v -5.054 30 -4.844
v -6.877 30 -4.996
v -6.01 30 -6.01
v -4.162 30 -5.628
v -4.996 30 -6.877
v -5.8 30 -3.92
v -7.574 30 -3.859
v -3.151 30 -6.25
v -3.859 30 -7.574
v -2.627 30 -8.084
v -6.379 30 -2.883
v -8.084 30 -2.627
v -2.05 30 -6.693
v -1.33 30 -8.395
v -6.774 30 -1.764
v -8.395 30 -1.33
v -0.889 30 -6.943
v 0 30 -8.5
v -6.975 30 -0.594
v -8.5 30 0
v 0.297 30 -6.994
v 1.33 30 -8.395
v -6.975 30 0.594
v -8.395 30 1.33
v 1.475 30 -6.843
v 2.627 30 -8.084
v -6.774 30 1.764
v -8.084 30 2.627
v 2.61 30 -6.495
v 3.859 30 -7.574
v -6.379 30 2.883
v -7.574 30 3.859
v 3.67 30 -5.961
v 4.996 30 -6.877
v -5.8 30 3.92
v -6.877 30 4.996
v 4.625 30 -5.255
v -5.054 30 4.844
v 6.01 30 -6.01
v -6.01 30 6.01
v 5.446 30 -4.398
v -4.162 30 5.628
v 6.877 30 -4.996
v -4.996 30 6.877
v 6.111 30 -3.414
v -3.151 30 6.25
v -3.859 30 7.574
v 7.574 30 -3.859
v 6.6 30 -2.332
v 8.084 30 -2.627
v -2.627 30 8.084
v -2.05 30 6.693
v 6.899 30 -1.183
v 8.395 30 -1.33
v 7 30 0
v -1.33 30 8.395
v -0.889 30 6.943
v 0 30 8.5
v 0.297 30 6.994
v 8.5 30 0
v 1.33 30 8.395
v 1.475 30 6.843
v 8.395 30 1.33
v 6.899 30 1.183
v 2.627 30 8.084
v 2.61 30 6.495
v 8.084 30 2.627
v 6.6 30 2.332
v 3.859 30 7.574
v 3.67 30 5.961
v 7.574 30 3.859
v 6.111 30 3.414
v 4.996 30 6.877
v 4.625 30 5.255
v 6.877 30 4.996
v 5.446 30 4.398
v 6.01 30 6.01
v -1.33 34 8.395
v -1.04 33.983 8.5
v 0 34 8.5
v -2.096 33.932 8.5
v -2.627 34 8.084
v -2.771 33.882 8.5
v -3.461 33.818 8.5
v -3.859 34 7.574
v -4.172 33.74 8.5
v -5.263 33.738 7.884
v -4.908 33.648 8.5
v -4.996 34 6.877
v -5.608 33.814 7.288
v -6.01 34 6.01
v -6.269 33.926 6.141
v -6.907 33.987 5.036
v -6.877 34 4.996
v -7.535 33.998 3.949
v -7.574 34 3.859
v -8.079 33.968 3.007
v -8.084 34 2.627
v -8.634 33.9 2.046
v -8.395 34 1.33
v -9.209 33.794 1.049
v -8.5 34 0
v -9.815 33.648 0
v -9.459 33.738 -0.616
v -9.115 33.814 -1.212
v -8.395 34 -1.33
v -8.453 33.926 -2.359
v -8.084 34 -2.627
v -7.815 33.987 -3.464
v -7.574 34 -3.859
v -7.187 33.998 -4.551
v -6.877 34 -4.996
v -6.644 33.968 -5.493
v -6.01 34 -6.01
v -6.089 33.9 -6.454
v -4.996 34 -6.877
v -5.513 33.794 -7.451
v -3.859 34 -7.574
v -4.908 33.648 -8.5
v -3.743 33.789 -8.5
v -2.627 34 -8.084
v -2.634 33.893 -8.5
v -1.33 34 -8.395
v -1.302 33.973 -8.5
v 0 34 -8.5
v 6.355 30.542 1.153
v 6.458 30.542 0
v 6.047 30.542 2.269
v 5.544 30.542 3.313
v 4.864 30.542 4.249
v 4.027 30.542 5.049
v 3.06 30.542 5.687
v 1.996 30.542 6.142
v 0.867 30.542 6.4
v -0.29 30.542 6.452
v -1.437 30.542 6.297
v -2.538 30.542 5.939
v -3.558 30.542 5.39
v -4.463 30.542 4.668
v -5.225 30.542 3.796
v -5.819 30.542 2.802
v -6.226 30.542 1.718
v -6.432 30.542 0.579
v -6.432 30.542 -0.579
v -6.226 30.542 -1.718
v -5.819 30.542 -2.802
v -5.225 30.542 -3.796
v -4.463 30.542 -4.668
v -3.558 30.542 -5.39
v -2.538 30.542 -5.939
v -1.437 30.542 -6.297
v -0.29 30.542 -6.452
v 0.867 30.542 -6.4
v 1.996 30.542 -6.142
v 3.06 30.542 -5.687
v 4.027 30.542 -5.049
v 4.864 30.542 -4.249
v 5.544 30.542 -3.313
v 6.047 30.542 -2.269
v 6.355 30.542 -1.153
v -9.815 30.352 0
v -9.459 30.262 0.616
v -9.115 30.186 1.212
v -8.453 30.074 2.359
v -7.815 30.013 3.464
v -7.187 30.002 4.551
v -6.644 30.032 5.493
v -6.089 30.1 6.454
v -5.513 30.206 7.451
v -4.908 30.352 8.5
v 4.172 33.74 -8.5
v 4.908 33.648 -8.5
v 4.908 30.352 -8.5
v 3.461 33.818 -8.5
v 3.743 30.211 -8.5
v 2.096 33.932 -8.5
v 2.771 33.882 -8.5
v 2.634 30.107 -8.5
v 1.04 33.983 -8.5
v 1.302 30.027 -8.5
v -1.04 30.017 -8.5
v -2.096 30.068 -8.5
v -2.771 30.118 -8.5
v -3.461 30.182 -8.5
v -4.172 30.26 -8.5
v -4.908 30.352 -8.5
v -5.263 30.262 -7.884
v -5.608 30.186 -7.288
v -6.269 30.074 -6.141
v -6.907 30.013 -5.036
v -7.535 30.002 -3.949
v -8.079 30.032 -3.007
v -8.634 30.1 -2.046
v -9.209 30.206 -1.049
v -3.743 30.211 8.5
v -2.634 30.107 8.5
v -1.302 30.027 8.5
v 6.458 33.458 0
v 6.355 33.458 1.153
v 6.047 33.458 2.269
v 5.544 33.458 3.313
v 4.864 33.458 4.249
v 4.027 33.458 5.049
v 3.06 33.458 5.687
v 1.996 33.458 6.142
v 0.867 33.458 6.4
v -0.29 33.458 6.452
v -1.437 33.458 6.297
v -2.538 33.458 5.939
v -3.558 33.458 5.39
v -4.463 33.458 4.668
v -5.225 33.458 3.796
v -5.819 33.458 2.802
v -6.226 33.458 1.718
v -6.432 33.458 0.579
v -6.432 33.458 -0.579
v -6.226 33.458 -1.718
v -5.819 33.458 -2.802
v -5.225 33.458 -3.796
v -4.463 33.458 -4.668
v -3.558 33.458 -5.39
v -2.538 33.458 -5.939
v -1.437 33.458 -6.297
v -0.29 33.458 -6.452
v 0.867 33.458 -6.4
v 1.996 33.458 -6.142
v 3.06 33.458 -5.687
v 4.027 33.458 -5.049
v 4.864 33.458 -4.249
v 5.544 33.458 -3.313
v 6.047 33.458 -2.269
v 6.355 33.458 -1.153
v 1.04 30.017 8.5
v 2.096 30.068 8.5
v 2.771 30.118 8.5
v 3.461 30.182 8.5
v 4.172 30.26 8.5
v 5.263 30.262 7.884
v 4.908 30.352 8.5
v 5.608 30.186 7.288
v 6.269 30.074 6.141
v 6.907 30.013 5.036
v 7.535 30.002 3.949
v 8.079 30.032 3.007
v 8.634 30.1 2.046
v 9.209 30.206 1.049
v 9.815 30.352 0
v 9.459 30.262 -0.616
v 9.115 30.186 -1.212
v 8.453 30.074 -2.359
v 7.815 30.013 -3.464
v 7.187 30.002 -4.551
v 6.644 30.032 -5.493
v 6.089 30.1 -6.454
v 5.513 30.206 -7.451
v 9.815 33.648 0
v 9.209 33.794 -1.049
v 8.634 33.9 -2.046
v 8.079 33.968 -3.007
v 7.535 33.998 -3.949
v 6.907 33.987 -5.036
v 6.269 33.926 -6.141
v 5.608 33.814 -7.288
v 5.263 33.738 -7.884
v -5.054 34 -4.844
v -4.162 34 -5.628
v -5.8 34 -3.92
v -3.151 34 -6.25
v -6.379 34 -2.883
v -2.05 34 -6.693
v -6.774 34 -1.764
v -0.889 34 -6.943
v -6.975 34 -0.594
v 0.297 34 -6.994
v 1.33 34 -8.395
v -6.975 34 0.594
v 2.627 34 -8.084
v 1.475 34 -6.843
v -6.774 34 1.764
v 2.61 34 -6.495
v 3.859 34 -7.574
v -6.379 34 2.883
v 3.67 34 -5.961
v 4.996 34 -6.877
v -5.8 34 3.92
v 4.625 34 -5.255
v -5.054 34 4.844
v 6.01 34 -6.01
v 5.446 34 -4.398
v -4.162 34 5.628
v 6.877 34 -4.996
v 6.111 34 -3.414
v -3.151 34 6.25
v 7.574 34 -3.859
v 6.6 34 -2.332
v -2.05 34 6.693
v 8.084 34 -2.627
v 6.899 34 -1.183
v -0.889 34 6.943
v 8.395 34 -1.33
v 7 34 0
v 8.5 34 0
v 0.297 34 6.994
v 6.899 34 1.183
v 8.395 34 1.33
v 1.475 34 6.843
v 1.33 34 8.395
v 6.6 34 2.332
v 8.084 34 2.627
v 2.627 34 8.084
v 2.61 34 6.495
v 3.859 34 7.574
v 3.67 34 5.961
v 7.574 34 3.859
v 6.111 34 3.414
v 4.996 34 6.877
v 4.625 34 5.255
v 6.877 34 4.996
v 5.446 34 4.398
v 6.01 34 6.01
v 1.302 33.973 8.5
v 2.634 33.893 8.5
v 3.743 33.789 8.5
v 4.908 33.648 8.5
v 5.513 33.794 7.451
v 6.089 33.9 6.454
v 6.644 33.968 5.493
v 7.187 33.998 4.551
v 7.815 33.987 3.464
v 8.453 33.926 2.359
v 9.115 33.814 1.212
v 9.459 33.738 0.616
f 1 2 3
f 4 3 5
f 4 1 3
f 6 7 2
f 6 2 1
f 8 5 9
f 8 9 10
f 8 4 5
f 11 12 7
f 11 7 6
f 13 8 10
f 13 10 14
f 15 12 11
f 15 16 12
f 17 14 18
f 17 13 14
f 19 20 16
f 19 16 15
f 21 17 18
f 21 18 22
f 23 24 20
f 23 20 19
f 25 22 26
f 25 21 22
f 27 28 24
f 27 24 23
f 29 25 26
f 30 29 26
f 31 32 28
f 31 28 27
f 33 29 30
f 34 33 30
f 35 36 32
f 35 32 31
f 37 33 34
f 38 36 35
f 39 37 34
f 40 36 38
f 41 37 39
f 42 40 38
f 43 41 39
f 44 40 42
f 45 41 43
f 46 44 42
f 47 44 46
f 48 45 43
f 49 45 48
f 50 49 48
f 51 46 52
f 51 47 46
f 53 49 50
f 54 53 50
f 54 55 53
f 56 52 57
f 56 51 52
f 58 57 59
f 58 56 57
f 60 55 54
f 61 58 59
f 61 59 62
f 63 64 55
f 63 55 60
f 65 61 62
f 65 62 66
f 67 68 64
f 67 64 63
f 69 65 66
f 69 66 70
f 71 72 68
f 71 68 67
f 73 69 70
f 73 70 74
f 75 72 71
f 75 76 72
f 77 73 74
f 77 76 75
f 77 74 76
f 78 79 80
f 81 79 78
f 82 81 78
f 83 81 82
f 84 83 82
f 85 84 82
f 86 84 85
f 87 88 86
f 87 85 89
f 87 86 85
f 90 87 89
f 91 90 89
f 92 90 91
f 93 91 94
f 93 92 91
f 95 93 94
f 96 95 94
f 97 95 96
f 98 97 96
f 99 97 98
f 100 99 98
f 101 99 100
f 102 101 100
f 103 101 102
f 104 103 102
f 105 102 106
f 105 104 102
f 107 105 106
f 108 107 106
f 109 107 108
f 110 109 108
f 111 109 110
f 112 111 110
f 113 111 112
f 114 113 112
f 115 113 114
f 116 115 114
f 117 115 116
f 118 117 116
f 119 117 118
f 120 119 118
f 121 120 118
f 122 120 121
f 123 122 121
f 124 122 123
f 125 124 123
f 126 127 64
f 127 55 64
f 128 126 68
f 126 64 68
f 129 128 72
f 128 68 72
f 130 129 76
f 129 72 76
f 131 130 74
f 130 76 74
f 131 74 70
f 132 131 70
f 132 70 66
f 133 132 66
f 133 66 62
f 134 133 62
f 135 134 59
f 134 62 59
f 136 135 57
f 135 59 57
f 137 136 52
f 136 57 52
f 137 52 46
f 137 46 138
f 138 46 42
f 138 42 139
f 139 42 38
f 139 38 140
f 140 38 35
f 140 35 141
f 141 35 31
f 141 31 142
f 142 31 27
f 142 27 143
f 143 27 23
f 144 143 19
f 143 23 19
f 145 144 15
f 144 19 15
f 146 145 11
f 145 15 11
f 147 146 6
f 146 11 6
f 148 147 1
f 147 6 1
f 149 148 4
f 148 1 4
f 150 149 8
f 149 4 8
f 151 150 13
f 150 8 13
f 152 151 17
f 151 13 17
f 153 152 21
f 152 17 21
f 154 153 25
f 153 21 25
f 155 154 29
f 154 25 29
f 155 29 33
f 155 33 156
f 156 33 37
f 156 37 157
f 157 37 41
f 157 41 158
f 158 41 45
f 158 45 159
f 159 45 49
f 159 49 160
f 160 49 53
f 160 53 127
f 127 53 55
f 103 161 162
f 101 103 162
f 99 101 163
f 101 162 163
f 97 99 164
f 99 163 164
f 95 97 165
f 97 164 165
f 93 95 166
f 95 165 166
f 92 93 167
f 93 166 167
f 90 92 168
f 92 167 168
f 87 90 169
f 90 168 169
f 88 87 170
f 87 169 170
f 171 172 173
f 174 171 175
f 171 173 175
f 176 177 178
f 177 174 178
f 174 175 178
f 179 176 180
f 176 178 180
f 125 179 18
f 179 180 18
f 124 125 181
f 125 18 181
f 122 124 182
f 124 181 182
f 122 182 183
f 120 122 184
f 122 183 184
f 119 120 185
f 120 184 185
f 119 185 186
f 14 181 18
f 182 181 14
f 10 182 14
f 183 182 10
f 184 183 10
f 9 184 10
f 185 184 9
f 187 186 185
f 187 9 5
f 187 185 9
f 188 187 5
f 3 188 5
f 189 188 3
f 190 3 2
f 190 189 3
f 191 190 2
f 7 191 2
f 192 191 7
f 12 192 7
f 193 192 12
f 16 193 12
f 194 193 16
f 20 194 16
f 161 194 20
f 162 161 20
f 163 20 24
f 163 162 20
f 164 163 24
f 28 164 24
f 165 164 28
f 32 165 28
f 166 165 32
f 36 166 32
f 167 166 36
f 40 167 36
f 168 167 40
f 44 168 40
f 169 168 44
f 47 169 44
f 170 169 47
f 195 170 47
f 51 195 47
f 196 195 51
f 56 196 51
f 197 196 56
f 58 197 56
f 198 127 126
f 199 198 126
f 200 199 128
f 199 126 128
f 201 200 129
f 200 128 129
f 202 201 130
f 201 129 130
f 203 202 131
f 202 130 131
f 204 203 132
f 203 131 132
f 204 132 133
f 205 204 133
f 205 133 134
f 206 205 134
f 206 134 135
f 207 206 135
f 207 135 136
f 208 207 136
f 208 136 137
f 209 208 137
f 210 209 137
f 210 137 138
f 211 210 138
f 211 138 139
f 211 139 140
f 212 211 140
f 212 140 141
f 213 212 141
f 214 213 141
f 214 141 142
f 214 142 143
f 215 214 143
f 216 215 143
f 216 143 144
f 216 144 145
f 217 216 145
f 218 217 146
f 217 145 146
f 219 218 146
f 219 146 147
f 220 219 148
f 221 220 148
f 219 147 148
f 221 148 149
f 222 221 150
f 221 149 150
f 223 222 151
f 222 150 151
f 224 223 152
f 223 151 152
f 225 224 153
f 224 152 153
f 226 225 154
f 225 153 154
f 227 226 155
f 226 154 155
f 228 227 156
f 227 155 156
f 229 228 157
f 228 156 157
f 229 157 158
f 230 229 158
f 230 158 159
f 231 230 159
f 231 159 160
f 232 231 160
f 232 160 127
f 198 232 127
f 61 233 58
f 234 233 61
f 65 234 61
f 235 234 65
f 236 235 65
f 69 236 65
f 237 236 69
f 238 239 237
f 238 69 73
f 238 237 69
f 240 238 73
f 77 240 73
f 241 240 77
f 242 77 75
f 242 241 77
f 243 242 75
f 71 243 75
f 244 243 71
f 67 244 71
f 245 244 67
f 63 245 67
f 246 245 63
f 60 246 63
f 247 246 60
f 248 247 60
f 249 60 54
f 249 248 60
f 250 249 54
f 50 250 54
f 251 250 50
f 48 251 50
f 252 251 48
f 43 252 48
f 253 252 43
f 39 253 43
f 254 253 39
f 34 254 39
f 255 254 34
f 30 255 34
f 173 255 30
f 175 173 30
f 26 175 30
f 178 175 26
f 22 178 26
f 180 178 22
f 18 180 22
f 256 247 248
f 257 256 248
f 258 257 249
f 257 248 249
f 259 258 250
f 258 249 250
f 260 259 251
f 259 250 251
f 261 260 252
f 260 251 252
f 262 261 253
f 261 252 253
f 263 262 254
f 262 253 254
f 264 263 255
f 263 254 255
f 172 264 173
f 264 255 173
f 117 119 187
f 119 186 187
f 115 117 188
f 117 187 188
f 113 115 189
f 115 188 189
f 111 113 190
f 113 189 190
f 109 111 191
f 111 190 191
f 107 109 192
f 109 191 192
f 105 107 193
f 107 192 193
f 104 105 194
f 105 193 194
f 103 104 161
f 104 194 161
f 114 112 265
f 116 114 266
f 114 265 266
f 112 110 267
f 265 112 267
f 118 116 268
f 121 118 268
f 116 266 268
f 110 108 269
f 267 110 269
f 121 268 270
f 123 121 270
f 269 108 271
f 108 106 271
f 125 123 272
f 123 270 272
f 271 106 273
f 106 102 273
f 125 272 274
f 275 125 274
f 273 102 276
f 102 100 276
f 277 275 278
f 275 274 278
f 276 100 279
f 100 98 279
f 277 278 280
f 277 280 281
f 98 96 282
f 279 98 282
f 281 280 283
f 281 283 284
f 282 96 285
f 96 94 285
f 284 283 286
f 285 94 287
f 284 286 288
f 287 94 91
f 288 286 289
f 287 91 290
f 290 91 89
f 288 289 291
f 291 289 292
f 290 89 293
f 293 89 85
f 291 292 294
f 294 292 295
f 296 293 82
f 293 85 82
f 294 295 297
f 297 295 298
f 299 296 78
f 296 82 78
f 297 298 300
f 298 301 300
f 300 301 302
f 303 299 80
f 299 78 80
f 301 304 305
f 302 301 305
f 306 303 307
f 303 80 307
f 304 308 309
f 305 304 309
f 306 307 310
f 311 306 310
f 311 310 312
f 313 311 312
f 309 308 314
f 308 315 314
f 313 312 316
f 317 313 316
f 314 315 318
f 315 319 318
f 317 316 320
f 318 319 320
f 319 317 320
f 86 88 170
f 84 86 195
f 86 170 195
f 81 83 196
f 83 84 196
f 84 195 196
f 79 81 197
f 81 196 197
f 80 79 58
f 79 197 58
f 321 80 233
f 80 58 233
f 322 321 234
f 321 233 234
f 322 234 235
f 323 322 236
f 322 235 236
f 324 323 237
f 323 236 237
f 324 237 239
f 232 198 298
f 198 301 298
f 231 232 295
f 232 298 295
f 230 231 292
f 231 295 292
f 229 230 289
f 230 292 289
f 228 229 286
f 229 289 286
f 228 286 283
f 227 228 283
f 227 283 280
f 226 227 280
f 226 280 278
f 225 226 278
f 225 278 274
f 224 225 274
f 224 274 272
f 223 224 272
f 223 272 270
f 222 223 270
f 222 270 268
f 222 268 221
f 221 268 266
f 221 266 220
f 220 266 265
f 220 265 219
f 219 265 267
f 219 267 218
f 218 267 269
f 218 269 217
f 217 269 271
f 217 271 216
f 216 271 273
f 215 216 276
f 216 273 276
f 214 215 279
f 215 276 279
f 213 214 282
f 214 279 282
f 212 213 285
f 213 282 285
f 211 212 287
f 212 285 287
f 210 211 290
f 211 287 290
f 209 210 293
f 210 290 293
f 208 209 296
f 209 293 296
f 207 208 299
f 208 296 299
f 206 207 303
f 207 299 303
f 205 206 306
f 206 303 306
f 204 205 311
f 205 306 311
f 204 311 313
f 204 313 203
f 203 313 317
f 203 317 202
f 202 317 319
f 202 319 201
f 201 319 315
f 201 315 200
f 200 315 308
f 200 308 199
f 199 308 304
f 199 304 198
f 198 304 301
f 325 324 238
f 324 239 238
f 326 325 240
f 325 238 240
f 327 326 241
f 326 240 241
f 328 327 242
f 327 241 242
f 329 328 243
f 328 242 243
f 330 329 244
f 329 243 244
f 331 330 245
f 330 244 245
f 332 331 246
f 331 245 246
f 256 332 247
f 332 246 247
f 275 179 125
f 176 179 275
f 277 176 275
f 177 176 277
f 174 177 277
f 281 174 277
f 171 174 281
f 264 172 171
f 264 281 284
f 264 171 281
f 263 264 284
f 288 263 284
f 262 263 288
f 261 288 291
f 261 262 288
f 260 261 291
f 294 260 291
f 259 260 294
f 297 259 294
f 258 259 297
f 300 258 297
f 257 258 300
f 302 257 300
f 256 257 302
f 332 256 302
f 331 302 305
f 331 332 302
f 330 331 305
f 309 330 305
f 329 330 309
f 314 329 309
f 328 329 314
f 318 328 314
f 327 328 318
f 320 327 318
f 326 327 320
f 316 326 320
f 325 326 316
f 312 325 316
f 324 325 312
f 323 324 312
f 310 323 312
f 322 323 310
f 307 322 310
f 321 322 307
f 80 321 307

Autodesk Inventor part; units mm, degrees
sketch "Sketch_1" plane through (0, 0, 0) normal (0, 0, 1) x (1, 0, 0)
  line L0 (0, 30) -> (0, 34)
  line L1 (0, 34) -> (8.5, 34)
  line L2 (8.5, 34) -> (10.2, 33.5445)
  line L3 (10.2, 33.5445) -> (10.2, 30.4555)
  line L4 (10.2, 30.4555) -> (8.5, 30)
  line L5 (8.5, 30) -> (0, 30)
  line L6 (0, 30) -> (0, 34)
revolve "Revolution1" add sketch "Sketch_1" angle 360 about axis through (0, 30, 0) along (0, -1, 0)
sketch "Sketch_2" plane through (0, 0, 0) normal (0, 0, 1) x (1, 0, 0)
  line L0 (0, 30) -> (0, 34)
  line L1 (0, 34) -> (7, 34)
  line L2 (7, 34) -> (6.4585, 33.4585)
  line L3 (6.4585, 33.4585) -> (6.4585, 30.5415)
  line L4 (6.4585, 30.5415) -> (7, 30)
  line L5 (7, 30) -> (0, 30)
  line L6 (0, 30) -> (0, 34)
revolve "Revolution2" cut sketch "Sketch_2" angle 360 about axis through (0, 30, 0) along (0, -1, 0)
thread "Thread1" size "M14x1" class "6H" standard "ISO Metric profile" full length
sketch "Sketch_3" plane through (0, 30, 0) normal (0, 1, 0) x (1, 0, 0)
  line L0 (-45, 45) -> (-45, -45)
  line L1 (-45, -45) -> (45, -45)
  line L2 (45, -45) -> (45, 45)
  line L3 (45, 45) -> (-45, 45)
  line L4 (-9.815, 0) -> (-4.9075, -8.5)
  line L5 (-4.9075, -8.5) -> (4.9075, -8.5)
  line L6 (4.9075, -8.5) -> (9.815, 0)
  line L7 (9.815, 0) -> (4.9075, 8.5)
  line L8 (4.9075, 8.5) -> (-4.9075, 8.5)
  line L9 (-4.9075, 8.5) -> (-9.815, 0)
extrude "Extrusion1" cut sketch "Sketch_3" along normal blind 4
ref_plane "NUT_TO_BODY_XY" through (0, 30, 0) normal (0, 1, 0) x (1, 0, 0)
ref_plane "NUT_TO_BODY_YZ" through (0, 30, 0) normal (1, 0, 0) x (0, 0, -1)
ref_plane "NUT_TO_BODY_ZX" through (0, 30, 0) normal (0, 0, -1) x (0, 1, 0)
properties part number "MVFKN40-NUT-NUT"
